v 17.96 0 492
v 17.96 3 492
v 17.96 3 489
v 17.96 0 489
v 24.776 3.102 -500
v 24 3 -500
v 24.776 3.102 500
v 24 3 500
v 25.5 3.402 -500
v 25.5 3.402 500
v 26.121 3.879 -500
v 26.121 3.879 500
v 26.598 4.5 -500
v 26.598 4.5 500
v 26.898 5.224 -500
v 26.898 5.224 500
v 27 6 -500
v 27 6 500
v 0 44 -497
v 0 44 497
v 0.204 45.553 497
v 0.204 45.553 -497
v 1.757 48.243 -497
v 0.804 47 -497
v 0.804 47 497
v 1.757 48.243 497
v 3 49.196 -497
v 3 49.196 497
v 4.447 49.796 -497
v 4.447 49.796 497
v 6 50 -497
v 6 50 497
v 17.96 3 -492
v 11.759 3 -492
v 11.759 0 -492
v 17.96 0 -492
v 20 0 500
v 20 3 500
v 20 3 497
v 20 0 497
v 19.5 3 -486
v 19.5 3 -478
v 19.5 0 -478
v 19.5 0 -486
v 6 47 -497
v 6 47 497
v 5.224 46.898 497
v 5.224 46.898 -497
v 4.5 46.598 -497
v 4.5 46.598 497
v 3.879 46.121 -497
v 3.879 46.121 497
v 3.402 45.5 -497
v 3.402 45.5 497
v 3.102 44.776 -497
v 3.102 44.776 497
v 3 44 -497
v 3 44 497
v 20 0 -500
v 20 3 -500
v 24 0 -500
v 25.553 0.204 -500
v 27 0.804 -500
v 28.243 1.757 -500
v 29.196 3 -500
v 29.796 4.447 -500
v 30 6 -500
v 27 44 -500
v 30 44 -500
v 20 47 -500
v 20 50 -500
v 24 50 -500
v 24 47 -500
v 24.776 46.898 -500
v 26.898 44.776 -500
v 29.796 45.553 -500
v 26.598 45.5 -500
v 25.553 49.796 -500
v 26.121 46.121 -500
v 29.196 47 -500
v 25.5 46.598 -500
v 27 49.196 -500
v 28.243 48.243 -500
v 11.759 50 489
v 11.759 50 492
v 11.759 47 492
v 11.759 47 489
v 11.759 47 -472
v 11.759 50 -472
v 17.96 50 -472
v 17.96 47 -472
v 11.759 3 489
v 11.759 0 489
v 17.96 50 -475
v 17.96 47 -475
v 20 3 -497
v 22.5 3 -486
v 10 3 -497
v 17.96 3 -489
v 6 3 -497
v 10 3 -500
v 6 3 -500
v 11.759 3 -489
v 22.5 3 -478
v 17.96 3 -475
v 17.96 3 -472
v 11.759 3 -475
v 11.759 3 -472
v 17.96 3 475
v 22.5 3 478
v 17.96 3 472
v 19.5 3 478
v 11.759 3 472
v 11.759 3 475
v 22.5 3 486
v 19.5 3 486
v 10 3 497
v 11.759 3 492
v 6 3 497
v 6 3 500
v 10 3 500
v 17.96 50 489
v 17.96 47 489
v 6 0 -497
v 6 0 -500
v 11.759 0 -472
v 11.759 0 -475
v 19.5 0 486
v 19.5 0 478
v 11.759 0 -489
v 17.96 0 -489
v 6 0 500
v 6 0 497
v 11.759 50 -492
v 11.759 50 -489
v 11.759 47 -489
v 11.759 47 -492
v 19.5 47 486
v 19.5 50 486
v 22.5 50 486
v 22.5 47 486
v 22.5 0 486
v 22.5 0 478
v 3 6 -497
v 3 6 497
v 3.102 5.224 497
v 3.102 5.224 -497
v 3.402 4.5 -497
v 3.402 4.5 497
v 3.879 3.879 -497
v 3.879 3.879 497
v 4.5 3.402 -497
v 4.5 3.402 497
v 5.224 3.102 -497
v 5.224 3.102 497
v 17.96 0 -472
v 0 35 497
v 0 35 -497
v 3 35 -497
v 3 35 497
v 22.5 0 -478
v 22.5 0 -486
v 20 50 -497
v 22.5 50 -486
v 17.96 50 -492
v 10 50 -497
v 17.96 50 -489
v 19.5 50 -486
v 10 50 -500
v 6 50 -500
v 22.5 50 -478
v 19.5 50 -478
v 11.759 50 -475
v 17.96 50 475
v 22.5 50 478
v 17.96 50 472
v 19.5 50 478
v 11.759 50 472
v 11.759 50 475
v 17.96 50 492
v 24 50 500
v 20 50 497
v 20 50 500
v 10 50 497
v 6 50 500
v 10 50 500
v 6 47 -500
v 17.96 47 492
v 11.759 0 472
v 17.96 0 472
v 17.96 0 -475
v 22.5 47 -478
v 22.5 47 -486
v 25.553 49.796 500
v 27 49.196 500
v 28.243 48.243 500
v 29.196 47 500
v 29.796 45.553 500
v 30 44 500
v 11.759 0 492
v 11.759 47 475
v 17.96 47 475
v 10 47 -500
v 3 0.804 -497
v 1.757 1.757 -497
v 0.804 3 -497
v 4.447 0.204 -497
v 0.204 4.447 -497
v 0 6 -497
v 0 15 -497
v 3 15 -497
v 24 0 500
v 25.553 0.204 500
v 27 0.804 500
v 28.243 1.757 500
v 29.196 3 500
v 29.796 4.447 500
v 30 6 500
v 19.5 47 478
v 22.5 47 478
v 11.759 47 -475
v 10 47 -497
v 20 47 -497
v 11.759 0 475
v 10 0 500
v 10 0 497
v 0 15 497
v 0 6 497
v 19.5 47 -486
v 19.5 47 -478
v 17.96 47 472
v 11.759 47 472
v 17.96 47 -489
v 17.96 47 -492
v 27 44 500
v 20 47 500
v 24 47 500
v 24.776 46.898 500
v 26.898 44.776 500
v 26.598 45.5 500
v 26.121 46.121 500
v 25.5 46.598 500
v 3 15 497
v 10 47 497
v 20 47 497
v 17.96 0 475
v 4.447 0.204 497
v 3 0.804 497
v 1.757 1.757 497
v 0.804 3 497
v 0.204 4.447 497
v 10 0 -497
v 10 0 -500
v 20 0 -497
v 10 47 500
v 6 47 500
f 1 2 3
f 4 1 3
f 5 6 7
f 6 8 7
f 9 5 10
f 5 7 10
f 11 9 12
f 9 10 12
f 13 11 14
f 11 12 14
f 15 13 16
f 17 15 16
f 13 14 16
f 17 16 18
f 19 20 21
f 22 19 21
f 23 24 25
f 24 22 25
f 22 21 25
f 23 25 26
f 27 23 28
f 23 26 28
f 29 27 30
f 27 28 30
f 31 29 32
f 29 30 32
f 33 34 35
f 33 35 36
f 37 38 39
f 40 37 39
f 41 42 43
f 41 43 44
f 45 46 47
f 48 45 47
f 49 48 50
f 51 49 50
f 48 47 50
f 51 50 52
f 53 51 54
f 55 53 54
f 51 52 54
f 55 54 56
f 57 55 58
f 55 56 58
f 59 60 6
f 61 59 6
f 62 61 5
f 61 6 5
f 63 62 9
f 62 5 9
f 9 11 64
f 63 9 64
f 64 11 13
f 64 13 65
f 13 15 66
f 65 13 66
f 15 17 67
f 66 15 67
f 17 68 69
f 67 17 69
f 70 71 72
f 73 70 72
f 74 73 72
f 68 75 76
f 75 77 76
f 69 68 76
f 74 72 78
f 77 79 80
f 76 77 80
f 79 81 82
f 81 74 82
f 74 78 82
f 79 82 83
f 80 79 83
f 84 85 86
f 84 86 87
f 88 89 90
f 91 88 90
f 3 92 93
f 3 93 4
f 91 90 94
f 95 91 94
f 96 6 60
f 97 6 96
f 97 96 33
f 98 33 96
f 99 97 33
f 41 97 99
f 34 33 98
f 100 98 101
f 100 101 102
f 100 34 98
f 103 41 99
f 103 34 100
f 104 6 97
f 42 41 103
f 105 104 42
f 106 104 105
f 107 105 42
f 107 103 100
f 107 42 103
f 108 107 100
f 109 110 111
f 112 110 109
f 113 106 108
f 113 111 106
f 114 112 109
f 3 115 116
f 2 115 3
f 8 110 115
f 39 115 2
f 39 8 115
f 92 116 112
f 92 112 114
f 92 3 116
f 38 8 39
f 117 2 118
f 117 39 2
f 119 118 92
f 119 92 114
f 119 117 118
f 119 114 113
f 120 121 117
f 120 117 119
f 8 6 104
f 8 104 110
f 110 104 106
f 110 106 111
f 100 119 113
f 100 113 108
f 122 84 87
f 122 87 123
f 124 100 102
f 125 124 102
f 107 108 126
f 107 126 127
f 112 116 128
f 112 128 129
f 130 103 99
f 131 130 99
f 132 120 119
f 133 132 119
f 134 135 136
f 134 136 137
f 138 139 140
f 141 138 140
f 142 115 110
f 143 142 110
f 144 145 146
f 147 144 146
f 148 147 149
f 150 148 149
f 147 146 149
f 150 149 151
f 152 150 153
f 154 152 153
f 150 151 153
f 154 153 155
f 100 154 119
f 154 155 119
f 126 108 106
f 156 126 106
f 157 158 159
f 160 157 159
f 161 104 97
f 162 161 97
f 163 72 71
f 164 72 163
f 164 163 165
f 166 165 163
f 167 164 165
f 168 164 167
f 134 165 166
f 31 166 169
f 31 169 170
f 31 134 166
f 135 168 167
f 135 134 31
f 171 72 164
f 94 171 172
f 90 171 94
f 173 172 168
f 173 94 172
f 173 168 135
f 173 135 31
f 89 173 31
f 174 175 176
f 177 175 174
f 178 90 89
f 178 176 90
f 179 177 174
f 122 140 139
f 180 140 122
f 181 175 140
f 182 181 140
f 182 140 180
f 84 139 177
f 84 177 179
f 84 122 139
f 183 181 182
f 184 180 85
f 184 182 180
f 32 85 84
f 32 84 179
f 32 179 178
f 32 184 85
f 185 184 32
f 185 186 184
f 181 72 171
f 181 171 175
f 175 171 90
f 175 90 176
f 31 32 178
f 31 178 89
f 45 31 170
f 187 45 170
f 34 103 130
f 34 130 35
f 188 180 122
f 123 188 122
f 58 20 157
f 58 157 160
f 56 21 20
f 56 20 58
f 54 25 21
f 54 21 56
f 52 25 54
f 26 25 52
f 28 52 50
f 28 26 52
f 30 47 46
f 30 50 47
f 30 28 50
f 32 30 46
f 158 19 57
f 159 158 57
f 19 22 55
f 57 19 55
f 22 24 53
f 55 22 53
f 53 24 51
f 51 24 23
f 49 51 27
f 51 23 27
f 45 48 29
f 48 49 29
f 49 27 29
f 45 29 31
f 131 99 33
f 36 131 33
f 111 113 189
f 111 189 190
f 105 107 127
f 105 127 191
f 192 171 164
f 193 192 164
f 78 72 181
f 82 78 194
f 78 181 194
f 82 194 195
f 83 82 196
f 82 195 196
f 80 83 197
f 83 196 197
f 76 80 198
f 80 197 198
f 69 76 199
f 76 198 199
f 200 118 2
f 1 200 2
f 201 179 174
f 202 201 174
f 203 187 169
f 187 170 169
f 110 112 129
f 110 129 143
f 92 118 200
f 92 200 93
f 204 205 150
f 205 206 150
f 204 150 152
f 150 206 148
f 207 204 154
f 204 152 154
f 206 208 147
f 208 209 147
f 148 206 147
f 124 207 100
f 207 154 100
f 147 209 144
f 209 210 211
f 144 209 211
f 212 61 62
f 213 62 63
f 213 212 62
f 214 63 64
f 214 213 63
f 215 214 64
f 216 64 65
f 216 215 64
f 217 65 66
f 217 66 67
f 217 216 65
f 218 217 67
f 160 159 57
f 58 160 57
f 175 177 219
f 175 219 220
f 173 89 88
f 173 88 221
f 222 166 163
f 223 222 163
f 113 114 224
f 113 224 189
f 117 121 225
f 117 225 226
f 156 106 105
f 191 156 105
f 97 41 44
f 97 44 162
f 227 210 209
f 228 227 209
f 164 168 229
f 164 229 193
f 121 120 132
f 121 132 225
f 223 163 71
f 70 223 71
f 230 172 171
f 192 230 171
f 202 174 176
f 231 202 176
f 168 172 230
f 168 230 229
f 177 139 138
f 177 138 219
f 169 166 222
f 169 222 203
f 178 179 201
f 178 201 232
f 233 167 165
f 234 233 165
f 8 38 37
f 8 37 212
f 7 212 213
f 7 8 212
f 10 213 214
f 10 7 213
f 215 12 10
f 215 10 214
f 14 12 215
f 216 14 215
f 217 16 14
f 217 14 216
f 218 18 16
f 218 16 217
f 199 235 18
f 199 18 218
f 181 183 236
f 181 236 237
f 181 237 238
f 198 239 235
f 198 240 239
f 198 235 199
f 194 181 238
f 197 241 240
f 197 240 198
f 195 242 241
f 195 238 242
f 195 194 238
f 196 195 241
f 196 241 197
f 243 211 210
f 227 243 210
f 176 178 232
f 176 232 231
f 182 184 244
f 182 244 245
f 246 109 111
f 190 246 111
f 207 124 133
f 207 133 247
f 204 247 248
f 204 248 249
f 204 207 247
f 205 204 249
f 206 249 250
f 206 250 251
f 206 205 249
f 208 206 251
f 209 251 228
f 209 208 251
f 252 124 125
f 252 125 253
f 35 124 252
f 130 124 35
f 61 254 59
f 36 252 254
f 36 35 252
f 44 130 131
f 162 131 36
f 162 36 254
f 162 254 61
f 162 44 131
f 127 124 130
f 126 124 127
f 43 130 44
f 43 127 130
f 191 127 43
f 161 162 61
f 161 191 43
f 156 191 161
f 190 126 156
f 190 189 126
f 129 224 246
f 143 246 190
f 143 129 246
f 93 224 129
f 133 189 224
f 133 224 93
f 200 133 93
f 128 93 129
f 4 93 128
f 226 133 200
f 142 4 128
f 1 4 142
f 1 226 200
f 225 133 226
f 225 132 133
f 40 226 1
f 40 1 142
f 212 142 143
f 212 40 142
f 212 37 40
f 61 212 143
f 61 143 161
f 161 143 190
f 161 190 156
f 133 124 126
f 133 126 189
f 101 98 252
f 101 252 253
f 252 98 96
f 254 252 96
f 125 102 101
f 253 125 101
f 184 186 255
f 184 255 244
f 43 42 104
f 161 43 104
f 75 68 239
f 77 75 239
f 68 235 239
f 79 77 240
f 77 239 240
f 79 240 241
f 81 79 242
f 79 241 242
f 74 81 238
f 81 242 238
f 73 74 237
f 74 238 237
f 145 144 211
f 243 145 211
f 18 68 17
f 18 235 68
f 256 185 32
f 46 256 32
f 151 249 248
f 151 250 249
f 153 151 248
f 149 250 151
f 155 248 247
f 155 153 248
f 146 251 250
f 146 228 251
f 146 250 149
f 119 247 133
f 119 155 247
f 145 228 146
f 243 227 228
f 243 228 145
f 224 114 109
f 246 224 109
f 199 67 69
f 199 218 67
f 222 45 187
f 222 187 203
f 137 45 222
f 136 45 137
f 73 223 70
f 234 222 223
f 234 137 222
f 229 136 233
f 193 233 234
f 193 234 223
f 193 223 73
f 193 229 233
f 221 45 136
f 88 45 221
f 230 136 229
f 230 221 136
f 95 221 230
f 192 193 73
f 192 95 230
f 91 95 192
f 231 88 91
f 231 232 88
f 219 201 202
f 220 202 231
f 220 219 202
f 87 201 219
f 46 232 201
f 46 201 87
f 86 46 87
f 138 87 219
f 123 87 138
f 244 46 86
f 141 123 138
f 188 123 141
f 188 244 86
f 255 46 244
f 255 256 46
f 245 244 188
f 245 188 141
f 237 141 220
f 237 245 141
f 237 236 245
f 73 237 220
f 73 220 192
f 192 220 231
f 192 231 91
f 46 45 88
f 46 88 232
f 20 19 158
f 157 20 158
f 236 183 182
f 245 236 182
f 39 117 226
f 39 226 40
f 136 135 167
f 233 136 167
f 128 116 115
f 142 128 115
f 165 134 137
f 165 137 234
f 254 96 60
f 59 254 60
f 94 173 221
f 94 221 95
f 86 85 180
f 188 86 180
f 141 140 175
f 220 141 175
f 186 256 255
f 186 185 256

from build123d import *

# Parameters (mm, degrees)
BOSS_EXTRUDE1_DEPTH = 500
FILLET1_R           = 6
FILLET2_R           = 3
SKETCH2_W           = 10
SKETCH2_H           = 3
SKETCH2_W_2         = 6
SKETCH2_W_3         = 6.201832359
SKETCH2_W_4         = 3
SKETCH2_H_2         = 8
CUT_EXTRUDE1_DEPTH  = 50


with BuildPart() as part:
    # Sketch1 → Boss-Extrude1 (new body, symmetric)
    with BuildSketch(Plane.XY):
        Polygon((0, 0), (30, 0), (30, 50), (0, 50), (0, 35), (3, 35), (3, 47), (27, 47), (27, 3), (3, 3), (3, 15), (0, 15), align=None)
    extrude(amount=BOSS_EXTRUDE1_DEPTH, both=True)

    # Fillet1
    fillet1_edges = [part.edges().sort_by_distance(p)[0] for p in [
        (0, 50, 0),
        (30, 50, 0),
        (30, 0, 0),
        (0, 0, 0),
    ]]
    fillet(fillet1_edges, radius=FILLET1_R)

    # Fillet2
    fillet2_edges = [part.edges().sort_by_distance(p)[0] for p in [
        (3, 3, 0),
        (27, 3, 0),
        (27, 47, 0),
        (3, 47, 0),
    ]]
    fillet(fillet2_edges, radius=FILLET2_R)

    # Sketch2 → Cut-Extrude1 (cut)
    with BuildSketch(Plane(origin=(0, 50, 0), x_dir=(1, 0, 0), z_dir=(0, 1, 0))):
        with Locations((15, 498.5)):
            Rectangle(SKETCH2_W, SKETCH2_H)
        with Locations((3, 498.5)):
            Rectangle(SKETCH2_W_2, SKETCH2_H)
        with Locations((3, -498.5)):
            Rectangle(SKETCH2_W_2, SKETCH2_H)
        with Locations((15, -498.5)):
            Rectangle(SKETCH2_W, SKETCH2_H)
        with Locations((14.859499195, 490.5)):
            Rectangle(SKETCH2_W_3, SKETCH2_H)
        with Locations((14.859499195, 473.5)):
            Rectangle(SKETCH2_W_3, SKETCH2_H)
        with Locations((21, 482)):
            Rectangle(SKETCH2_W_4, SKETCH2_H_2)
        with Locations((14.859499195, -473.5)):
            Rectangle(SKETCH2_W_3, SKETCH2_H)
        with Locations((21, -482)):
            Rectangle(SKETCH2_W_4, SKETCH2_H_2)
        with Locations((14.859499195, -490.5)):
            Rectangle(SKETCH2_W_3, SKETCH2_H)
    extrude(amount=-CUT_EXTRUDE1_DEPTH, mode=Mode.SUBTRACT)


solid = part.part
